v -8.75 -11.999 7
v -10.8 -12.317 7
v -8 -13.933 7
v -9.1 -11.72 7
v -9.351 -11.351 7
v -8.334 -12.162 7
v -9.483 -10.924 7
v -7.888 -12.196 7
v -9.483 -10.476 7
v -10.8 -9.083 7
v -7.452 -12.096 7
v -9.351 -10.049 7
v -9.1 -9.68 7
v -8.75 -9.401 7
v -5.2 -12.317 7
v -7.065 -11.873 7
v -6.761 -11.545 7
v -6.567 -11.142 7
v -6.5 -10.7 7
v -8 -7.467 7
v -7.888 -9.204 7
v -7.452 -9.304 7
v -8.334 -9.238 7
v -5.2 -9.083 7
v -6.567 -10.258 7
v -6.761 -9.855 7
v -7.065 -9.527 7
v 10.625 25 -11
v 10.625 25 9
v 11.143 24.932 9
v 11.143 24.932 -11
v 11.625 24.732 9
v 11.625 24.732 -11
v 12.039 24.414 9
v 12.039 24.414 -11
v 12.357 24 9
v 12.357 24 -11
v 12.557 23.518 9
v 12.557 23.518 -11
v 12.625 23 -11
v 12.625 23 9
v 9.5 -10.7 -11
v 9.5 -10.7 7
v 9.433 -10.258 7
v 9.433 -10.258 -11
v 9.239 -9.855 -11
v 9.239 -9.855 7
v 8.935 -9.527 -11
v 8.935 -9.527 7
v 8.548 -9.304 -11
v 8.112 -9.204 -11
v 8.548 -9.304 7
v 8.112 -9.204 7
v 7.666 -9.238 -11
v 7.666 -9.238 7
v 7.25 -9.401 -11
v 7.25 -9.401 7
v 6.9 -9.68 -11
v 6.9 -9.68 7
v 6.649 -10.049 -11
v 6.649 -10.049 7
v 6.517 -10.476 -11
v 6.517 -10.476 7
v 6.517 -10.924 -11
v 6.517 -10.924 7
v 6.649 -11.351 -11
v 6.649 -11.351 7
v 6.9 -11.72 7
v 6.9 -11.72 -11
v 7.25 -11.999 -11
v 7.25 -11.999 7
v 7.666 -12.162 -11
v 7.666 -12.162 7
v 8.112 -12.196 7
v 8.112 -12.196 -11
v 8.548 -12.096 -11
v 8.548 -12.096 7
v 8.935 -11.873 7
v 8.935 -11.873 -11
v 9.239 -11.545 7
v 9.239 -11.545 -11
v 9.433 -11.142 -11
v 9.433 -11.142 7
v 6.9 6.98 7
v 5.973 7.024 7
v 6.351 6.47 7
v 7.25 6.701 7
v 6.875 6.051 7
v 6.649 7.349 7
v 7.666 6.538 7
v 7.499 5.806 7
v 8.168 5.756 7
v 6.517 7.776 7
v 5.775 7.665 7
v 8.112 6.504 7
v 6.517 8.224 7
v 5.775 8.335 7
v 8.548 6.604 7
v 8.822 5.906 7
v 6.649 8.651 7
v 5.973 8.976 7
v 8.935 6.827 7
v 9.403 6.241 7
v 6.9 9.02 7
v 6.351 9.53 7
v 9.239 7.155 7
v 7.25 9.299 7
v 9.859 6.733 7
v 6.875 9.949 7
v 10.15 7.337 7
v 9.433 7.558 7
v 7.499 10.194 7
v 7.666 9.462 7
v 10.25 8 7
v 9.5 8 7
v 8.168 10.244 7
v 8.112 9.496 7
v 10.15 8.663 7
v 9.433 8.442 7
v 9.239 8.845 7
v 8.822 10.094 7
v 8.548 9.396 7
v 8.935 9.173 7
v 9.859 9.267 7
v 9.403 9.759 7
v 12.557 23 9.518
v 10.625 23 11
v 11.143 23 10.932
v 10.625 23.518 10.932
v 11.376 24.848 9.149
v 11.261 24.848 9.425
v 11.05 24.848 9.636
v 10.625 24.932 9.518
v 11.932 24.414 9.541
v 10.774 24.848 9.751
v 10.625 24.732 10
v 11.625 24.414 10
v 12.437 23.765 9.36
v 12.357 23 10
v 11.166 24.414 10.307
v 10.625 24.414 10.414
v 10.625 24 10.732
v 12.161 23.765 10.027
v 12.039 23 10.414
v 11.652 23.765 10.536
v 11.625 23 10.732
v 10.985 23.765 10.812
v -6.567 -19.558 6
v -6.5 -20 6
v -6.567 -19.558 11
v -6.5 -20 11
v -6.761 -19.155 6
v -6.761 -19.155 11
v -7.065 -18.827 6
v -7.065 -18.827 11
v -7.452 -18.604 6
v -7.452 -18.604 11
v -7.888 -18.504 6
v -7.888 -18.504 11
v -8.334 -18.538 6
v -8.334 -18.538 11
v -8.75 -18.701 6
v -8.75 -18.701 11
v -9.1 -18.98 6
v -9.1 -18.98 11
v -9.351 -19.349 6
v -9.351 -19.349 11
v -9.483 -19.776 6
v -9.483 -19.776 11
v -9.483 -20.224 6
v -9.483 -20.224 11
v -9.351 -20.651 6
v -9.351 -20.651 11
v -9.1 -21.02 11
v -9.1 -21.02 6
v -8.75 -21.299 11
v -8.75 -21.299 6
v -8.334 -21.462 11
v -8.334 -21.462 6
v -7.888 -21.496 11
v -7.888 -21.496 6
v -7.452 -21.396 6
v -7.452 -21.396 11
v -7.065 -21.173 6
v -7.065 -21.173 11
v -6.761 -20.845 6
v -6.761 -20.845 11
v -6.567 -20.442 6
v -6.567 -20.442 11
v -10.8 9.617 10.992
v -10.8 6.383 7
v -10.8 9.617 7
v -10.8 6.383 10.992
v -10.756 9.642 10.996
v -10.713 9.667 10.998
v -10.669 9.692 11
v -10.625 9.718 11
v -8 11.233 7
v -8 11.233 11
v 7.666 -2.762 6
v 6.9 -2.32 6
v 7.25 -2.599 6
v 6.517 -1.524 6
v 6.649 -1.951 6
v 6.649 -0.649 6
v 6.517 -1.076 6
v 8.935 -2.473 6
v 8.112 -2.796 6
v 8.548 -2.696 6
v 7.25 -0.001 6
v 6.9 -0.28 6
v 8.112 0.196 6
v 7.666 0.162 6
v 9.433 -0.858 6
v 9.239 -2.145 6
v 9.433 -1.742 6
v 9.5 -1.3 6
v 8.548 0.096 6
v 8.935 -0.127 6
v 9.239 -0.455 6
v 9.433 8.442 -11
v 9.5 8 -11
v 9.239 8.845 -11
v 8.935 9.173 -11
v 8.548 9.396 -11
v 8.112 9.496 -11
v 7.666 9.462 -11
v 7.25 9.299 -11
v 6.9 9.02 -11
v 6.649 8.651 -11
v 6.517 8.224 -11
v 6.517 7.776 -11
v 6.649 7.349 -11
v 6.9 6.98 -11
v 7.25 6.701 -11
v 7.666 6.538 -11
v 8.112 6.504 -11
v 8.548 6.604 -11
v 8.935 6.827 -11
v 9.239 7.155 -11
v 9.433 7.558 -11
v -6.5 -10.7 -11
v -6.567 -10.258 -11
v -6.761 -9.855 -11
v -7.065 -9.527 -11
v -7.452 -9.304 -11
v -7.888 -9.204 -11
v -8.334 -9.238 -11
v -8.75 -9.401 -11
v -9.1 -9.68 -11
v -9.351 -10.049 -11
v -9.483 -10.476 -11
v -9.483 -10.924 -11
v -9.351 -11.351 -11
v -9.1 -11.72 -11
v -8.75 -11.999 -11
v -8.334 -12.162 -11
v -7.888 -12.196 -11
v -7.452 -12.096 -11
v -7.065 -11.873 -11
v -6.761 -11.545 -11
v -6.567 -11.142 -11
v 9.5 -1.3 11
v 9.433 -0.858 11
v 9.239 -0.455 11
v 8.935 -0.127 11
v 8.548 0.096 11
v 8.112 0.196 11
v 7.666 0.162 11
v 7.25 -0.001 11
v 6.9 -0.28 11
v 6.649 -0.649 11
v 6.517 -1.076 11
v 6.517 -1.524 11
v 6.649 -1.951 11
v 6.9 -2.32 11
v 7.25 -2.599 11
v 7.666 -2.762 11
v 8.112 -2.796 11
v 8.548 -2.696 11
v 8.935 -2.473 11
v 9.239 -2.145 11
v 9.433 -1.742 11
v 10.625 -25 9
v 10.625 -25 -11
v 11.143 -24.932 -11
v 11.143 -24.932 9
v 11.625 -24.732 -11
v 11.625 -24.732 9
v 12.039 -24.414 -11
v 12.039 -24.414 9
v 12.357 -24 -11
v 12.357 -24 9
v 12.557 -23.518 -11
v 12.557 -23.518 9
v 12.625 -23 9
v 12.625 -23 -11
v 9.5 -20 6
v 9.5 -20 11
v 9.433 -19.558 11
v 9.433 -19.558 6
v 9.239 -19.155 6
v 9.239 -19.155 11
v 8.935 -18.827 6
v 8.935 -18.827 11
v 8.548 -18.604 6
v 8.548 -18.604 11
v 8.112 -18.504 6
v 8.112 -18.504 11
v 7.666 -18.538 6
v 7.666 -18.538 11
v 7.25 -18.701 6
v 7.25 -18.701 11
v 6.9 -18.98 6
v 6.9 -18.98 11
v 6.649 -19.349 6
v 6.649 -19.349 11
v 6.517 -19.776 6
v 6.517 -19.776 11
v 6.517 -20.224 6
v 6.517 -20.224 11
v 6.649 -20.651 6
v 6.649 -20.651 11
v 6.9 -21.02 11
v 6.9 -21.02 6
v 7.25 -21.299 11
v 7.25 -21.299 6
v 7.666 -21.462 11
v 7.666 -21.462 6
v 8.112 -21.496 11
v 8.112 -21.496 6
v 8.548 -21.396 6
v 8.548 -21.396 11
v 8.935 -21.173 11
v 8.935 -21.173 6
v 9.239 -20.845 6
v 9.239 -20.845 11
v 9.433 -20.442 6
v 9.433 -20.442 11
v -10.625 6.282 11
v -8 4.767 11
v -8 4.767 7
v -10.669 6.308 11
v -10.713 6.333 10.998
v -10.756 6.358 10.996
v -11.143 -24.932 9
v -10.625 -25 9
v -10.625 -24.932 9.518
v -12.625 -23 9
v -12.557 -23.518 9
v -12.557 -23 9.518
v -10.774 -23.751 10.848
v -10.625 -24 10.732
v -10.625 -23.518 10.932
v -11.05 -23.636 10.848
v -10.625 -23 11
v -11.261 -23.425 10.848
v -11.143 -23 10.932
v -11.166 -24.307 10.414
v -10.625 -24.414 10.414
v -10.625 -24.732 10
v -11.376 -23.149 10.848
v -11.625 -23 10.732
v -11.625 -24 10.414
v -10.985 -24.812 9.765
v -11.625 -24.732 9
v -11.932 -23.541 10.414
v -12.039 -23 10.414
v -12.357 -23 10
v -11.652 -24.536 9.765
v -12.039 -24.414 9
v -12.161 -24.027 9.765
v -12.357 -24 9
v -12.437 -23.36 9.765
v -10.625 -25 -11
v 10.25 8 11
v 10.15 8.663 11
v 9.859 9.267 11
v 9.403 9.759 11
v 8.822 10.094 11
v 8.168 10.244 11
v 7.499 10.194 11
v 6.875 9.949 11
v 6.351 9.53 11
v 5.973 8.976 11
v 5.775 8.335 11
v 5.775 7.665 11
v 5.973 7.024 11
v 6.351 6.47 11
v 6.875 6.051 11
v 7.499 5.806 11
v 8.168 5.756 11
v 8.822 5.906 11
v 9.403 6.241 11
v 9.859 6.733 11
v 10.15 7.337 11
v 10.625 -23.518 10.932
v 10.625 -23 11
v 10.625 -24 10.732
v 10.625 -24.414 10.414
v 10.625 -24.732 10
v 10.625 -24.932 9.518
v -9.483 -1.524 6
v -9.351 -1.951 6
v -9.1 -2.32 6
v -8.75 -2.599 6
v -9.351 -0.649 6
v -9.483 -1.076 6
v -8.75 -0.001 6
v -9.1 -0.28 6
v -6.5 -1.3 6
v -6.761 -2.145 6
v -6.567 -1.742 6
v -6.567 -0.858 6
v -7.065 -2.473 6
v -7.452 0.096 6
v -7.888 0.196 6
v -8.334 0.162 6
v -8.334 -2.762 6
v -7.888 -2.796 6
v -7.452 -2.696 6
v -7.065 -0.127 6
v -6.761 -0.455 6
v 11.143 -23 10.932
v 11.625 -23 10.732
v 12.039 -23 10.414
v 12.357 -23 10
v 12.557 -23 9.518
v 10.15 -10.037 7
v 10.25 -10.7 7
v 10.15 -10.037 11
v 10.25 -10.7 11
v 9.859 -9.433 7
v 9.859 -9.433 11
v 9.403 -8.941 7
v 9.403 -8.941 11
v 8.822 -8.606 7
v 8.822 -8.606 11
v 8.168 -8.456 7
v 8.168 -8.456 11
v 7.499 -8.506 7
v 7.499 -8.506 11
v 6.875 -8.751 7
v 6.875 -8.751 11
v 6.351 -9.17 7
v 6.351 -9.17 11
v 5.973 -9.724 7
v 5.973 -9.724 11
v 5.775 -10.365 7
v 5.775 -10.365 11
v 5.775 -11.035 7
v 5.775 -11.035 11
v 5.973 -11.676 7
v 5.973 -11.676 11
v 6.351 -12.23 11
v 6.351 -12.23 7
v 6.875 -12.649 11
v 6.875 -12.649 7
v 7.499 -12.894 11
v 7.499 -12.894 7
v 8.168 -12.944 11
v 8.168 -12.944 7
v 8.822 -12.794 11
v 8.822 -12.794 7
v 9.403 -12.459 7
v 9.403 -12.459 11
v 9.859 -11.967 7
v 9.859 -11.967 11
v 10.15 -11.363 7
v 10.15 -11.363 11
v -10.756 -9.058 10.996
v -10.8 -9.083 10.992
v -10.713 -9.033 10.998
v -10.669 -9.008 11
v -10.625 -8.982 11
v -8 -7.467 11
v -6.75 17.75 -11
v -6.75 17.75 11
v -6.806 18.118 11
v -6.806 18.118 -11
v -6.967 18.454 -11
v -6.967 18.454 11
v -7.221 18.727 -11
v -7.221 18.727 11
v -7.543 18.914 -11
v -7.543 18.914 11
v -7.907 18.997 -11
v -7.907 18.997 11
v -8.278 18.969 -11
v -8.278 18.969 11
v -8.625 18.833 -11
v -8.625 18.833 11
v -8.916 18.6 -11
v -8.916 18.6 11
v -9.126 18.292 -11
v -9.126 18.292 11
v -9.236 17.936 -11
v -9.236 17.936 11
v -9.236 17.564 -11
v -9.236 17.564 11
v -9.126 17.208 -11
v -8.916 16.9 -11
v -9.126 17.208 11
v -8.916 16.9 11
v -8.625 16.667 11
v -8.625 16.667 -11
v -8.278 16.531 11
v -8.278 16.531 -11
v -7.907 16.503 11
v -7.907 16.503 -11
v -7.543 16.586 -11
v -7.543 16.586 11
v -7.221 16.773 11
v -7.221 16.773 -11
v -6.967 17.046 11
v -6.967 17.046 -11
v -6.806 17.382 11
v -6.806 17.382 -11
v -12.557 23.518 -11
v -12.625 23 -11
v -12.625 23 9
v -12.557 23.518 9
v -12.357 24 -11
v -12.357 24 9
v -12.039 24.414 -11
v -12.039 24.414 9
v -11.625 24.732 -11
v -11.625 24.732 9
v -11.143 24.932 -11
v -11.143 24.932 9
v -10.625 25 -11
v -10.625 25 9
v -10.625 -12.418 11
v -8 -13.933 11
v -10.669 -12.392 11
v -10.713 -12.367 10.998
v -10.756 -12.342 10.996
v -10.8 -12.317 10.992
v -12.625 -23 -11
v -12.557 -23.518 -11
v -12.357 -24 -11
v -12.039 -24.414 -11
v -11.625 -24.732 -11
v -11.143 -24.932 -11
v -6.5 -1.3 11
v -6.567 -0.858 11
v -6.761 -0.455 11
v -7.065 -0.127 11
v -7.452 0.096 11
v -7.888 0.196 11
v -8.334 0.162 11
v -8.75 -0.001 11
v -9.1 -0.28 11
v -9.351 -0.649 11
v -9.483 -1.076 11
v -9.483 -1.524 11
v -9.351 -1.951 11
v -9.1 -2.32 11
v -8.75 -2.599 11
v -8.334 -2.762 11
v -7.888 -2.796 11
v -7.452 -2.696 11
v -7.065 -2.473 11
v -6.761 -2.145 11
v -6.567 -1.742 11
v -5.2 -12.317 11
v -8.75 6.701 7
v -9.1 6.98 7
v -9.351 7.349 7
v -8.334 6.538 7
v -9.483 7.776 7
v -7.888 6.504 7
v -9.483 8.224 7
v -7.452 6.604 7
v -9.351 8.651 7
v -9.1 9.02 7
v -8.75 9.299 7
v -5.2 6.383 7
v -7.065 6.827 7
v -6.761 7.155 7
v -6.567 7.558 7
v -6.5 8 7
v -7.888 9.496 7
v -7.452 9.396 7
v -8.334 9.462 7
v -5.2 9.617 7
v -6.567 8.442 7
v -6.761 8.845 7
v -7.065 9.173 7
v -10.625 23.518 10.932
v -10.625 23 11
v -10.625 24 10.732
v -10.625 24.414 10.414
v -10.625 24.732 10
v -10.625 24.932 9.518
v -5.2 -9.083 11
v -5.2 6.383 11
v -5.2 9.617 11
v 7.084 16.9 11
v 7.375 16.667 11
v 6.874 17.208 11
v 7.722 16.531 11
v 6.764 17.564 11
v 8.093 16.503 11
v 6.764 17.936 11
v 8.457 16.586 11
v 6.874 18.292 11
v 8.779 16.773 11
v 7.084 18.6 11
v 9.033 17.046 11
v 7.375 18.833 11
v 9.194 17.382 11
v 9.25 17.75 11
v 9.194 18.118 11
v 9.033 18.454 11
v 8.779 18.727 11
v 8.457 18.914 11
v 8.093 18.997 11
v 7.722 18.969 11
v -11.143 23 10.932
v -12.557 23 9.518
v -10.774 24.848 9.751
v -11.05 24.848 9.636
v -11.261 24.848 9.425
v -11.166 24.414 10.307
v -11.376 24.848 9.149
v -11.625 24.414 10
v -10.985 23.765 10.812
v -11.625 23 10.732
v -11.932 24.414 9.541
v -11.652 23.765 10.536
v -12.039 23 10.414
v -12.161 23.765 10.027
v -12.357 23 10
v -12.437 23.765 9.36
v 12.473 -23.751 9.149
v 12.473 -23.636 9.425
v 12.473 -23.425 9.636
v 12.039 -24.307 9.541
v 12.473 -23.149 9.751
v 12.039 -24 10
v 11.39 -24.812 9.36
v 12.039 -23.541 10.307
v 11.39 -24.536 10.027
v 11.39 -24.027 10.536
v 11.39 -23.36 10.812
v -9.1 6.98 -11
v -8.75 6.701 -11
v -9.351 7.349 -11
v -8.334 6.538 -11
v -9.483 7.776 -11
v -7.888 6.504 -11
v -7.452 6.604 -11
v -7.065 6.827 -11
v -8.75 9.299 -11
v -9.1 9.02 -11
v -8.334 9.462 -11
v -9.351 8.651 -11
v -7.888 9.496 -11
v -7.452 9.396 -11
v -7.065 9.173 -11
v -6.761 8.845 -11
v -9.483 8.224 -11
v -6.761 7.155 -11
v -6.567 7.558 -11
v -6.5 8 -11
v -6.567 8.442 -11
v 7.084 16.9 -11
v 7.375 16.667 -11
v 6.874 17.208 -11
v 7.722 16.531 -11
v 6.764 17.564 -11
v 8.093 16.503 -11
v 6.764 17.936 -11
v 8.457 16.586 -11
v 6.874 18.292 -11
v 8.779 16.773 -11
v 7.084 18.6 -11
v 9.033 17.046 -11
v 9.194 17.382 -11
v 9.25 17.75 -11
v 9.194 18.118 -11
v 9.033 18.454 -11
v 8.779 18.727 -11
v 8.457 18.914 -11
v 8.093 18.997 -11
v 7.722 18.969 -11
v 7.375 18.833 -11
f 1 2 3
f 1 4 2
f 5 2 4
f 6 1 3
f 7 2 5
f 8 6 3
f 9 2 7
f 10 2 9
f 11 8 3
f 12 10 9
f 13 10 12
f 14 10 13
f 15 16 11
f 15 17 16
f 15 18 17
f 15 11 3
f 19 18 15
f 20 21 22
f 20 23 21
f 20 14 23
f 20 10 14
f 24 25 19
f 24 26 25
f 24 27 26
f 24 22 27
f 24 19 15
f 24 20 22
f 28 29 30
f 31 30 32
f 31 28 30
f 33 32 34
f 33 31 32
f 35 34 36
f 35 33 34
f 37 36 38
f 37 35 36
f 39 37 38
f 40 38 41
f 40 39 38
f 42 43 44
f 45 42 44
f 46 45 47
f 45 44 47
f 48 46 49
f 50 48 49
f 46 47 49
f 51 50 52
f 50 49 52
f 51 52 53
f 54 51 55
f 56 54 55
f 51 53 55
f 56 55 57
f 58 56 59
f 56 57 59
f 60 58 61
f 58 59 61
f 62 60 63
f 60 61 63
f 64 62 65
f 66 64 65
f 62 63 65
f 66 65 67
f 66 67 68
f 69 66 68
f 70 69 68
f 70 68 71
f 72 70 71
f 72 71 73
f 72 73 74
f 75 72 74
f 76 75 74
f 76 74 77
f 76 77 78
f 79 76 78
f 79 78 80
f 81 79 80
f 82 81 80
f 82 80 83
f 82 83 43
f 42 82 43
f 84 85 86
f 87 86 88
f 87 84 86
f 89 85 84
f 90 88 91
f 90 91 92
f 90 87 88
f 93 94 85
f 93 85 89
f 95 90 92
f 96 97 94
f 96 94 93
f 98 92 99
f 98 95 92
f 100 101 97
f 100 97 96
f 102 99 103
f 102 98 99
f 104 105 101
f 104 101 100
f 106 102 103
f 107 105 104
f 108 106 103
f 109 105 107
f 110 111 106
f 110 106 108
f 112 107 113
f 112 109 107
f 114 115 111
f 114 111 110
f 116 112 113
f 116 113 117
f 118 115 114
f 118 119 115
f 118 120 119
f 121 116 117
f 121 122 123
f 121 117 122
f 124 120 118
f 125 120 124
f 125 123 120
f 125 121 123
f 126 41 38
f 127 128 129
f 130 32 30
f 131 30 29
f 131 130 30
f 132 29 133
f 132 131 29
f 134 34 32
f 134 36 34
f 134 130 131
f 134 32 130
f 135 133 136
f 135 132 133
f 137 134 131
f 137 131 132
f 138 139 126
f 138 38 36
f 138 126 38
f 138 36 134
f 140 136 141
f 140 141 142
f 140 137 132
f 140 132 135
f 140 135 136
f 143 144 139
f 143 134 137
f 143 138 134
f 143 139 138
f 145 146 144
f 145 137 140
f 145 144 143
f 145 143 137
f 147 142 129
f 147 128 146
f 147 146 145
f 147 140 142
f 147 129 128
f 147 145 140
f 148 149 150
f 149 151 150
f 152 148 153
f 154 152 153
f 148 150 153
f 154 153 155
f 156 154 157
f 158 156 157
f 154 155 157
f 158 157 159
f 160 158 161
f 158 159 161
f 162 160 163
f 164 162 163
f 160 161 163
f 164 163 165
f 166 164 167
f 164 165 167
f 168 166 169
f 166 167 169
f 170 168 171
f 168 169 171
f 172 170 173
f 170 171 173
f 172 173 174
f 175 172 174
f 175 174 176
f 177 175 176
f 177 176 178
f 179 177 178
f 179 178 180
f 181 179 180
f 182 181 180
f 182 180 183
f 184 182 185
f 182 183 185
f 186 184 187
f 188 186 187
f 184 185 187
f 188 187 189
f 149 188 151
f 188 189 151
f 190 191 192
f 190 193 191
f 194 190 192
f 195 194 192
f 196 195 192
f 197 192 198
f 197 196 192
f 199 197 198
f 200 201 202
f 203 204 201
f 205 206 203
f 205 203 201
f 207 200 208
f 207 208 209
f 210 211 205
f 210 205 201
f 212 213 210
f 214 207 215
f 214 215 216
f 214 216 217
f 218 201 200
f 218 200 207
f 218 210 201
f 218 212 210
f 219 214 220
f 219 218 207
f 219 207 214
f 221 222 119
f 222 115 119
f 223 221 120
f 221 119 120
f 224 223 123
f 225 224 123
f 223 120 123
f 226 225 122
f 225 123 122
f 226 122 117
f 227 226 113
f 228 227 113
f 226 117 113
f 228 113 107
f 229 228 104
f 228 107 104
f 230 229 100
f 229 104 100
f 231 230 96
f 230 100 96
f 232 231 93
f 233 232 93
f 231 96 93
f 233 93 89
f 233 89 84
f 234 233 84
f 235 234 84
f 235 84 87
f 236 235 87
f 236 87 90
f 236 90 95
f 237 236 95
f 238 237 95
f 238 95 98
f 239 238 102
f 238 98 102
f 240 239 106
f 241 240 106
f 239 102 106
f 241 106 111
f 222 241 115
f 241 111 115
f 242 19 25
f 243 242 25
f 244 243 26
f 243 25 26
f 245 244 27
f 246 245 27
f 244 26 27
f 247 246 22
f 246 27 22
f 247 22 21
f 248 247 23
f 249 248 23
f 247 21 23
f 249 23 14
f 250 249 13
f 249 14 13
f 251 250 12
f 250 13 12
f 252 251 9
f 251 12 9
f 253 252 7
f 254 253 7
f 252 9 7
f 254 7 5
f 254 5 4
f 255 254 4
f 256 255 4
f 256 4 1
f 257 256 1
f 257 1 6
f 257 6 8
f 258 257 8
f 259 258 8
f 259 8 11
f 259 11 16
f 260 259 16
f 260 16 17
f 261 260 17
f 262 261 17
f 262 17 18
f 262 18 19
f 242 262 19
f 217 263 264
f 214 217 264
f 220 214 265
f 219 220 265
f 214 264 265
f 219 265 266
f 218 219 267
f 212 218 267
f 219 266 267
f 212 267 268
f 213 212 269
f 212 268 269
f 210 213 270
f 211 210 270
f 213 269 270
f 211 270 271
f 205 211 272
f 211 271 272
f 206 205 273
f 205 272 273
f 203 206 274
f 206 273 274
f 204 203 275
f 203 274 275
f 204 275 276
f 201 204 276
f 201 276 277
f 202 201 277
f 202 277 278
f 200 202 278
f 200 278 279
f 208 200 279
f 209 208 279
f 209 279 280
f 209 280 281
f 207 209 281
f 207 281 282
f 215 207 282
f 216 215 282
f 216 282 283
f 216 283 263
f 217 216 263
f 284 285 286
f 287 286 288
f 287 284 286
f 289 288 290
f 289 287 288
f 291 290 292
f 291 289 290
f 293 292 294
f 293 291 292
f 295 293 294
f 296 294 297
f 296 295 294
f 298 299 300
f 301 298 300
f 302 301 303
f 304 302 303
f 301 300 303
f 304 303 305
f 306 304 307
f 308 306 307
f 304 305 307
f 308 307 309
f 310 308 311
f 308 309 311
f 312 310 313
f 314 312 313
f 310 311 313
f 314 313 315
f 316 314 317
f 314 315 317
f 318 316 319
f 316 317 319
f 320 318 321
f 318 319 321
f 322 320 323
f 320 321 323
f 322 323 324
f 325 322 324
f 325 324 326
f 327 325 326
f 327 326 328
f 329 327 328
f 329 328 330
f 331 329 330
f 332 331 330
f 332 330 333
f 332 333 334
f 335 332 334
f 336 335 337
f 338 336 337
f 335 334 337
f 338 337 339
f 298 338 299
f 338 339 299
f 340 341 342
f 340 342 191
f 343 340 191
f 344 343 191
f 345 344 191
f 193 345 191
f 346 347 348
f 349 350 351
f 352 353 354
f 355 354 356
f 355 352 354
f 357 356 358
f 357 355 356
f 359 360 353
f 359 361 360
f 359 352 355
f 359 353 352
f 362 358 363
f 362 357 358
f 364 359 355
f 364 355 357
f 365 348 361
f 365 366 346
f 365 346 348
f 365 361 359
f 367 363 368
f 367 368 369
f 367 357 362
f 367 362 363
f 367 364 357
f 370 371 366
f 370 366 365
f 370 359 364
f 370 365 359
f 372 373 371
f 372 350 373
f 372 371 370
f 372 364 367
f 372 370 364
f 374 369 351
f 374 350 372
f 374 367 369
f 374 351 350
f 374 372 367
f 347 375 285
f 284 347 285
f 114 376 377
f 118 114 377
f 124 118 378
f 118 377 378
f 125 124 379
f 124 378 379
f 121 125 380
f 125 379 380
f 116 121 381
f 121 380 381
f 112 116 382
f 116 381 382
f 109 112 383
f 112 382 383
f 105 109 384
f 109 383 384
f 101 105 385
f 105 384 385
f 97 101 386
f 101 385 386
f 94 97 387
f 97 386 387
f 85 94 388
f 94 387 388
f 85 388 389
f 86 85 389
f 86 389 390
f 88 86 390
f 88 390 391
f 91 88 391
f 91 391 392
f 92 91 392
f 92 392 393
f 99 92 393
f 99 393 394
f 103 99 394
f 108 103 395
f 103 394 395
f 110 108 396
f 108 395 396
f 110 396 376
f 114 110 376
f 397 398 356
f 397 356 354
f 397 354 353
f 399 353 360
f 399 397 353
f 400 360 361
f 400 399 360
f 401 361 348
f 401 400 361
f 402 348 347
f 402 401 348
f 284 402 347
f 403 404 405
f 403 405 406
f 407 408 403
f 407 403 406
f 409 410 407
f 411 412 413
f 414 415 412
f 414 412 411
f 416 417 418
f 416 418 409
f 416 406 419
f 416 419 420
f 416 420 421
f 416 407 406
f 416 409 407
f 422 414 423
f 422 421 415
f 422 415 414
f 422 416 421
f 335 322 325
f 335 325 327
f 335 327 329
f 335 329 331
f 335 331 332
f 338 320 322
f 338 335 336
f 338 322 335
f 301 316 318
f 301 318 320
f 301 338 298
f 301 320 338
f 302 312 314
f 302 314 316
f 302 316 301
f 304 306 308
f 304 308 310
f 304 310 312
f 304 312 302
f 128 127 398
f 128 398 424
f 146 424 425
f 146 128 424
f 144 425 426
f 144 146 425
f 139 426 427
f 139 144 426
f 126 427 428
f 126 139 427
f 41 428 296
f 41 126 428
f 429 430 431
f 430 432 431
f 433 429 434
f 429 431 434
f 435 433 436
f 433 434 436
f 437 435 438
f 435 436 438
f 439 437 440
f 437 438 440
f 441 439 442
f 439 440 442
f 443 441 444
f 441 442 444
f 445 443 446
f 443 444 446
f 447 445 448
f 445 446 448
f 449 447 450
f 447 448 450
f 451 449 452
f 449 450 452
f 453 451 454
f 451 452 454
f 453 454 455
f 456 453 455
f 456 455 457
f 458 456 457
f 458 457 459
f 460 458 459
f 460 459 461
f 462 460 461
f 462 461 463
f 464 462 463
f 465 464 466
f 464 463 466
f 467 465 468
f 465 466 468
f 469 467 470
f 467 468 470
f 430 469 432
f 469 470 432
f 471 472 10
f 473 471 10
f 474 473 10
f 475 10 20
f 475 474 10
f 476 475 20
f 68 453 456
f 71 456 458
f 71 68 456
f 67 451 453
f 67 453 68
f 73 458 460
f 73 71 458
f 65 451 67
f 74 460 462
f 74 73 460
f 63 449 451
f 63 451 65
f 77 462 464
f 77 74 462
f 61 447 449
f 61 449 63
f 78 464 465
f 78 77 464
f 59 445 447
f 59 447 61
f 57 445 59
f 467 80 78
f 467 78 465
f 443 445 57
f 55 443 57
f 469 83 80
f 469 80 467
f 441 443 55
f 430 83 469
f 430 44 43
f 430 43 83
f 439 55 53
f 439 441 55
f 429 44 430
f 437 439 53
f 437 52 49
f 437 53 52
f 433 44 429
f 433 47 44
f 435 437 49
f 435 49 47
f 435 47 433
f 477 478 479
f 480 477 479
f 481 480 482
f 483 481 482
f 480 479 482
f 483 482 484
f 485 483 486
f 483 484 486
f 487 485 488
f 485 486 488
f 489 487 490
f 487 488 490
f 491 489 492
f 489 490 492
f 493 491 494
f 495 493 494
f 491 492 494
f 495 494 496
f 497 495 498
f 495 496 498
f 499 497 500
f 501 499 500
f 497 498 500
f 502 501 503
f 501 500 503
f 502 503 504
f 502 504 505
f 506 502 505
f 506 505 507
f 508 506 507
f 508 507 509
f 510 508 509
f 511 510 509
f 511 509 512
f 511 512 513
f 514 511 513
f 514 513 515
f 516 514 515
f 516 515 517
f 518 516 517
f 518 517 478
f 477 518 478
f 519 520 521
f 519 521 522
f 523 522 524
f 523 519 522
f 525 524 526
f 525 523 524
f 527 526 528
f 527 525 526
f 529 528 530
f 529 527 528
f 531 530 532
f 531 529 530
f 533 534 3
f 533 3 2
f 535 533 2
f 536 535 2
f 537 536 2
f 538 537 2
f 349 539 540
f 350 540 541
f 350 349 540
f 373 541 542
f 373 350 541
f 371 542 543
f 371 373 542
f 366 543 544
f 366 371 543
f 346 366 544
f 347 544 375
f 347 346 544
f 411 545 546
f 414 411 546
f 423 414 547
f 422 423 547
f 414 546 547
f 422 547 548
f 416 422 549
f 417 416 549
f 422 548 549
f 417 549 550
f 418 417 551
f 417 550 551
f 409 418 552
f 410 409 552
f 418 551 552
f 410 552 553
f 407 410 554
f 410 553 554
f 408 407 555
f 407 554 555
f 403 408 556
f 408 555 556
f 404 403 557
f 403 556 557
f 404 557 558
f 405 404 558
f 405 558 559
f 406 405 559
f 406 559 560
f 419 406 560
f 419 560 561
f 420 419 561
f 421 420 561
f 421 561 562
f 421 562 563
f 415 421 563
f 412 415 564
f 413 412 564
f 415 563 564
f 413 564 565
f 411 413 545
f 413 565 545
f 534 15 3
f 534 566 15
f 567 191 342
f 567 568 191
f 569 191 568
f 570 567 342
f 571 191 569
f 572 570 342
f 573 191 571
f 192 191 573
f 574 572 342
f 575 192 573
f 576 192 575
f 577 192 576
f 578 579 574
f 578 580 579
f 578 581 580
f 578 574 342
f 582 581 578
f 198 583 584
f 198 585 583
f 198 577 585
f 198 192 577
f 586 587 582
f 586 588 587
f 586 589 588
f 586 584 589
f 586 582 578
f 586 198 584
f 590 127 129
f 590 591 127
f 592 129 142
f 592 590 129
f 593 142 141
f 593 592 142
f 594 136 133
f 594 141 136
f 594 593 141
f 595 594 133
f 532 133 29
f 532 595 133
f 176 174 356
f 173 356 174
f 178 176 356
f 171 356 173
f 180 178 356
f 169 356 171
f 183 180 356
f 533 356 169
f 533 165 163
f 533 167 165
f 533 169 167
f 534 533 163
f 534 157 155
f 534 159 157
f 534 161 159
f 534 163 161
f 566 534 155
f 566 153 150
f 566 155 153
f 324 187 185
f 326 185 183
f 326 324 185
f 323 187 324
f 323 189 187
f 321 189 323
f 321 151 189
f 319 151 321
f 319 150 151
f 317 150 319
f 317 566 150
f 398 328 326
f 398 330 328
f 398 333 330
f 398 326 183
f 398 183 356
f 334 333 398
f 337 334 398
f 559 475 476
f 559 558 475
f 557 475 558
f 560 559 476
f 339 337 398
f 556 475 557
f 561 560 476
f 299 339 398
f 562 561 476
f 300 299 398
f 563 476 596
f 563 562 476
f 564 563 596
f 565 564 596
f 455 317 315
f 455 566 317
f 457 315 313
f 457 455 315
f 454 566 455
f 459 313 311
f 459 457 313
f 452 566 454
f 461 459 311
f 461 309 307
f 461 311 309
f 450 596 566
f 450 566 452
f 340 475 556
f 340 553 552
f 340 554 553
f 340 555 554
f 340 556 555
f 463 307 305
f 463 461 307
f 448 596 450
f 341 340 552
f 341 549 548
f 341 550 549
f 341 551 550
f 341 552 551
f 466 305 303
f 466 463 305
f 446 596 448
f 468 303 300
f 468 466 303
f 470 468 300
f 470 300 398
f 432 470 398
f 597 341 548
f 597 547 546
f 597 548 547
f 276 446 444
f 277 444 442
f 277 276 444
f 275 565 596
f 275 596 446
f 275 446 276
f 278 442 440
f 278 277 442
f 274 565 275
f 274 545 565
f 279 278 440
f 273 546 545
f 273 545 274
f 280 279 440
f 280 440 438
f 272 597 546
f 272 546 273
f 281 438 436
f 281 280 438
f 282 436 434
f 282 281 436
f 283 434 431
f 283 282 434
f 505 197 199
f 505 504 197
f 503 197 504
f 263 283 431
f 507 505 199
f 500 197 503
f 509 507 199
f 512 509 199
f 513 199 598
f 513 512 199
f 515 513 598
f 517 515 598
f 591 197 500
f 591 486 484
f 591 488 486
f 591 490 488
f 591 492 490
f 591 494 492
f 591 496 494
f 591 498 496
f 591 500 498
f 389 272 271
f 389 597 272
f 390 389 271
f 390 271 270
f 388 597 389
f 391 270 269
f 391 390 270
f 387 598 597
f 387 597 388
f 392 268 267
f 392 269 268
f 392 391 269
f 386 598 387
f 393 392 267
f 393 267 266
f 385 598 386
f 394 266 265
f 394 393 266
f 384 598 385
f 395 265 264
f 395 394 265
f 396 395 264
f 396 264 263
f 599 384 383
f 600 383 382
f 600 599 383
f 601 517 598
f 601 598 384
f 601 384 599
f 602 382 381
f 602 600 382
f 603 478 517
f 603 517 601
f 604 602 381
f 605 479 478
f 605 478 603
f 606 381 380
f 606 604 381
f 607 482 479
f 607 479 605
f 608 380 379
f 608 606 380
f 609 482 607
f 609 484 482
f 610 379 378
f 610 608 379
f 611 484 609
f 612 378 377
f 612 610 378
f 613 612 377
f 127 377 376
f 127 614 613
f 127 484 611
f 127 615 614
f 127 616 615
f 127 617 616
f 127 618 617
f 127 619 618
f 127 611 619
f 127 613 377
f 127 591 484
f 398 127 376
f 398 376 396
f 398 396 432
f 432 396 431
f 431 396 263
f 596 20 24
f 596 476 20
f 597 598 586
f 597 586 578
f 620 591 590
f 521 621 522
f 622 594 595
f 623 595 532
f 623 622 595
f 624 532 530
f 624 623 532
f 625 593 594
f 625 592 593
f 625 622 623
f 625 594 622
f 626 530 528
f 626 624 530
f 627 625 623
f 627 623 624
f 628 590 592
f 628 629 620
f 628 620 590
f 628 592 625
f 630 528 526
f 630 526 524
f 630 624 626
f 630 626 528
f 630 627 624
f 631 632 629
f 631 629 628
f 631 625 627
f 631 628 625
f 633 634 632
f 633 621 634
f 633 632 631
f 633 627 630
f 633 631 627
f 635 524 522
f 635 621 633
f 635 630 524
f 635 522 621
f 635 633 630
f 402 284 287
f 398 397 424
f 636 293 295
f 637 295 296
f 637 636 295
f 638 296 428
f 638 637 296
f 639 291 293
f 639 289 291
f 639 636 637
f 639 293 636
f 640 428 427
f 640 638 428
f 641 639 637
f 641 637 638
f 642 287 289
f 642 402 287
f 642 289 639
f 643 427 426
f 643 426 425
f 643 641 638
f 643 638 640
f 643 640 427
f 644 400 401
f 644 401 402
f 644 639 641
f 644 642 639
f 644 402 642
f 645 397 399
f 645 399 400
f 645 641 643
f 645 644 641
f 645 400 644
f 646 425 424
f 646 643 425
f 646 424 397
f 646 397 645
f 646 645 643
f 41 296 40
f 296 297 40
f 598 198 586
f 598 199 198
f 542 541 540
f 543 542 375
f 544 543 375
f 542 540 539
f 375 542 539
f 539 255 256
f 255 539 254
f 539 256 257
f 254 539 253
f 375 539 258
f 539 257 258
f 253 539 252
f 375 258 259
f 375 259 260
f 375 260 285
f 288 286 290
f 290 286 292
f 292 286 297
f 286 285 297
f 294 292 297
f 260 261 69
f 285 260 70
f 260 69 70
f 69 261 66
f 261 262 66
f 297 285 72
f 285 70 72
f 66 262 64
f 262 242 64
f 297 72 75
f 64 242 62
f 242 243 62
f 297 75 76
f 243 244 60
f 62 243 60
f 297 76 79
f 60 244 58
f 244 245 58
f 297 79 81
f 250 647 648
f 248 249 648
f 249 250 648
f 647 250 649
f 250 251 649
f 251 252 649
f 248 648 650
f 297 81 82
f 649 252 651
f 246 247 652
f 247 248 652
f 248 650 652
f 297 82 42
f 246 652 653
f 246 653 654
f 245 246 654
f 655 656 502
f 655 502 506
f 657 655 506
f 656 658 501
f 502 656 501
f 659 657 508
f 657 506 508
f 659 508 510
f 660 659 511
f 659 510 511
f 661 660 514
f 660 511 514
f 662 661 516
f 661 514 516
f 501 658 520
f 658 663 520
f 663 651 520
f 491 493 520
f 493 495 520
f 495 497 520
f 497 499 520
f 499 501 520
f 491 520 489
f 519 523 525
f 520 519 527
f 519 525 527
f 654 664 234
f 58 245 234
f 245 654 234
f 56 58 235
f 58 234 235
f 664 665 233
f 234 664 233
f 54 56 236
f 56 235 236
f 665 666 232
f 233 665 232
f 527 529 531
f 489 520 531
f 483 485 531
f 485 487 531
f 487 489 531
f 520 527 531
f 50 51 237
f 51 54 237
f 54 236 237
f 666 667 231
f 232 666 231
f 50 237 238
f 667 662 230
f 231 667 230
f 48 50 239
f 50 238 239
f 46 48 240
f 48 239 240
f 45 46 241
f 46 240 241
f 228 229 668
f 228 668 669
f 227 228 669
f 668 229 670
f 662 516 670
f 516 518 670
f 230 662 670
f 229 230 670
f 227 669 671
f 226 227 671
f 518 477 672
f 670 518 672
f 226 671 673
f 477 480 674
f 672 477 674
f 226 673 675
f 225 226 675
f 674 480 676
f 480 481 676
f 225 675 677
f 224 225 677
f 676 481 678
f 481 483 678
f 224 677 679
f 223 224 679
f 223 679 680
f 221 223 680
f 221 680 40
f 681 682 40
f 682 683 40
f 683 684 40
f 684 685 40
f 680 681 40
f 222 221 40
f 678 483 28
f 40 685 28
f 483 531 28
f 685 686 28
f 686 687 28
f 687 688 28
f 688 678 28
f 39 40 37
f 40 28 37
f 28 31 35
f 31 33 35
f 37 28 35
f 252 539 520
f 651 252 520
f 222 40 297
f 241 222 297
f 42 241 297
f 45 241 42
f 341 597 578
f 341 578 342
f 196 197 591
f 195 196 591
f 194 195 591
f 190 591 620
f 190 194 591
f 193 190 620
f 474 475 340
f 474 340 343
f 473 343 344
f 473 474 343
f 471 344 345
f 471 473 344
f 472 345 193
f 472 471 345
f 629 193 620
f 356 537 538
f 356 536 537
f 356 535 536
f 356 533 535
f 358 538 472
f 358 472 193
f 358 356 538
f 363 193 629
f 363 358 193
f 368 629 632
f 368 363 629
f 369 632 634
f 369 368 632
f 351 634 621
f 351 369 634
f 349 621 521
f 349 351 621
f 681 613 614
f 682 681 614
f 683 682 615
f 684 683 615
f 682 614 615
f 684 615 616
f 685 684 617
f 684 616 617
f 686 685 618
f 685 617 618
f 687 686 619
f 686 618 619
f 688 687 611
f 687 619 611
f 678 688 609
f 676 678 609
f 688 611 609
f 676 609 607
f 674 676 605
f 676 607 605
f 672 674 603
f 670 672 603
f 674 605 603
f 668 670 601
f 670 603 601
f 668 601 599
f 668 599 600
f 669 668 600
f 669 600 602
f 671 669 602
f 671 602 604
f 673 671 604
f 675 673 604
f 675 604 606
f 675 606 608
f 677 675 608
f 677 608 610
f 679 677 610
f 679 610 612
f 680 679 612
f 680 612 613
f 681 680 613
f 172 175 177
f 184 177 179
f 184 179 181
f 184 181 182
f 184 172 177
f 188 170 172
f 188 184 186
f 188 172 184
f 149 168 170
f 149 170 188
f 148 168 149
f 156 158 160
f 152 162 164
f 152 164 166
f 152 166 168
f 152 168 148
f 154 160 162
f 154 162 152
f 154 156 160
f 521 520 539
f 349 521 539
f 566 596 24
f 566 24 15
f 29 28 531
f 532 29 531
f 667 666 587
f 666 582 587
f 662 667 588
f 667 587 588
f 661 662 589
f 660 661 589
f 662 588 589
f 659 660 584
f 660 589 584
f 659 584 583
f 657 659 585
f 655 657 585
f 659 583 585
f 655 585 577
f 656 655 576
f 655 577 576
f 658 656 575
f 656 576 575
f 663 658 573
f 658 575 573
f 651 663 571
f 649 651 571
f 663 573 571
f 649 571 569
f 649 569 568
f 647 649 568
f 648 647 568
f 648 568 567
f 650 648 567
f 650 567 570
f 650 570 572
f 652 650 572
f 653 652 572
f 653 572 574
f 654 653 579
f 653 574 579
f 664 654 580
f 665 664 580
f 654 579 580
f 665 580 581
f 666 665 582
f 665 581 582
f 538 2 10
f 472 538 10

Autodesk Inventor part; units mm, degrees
ref_plane "YZ Plane" through (0, 0, 0) normal (1, 0, 0) x (0, 1, 0)
ref_plane "XZ Plane" through (0, 0, 0) normal (0, 1, 0) x (-1, 0, 0)
ref_plane "XY Plane" through (0, 0, 0) normal (0, 0, 1) x (1, 0, 0)
sketch "Эскиз1" plane through (0, 0, 0) normal (0, 0, 1) x (1, 0, 0)
  line L0 (-12.625, -25) -> (12.625, -25)
  line L1 (12.625, -25) -> (12.625, 25)
  line L2 (12.625, 25) -> (-12.625, 25)
  line L3 (-12.625, 25) -> (-12.625, -25)
  line L4 (-12.625, -25) -> (12.625, 25) construction
  line L5 (12.625, -25) -> (-12.625, 25) construction
  point P0 (0, 0)
  dimension "d0" = 25.25
  dimension "d1" = 50
extrude "Выдавливание1" add sketch "Эскиз1" along normal mid plane 22
fillet "Сопряжение1" radius 2 8 edges at (-12.625, -25, 0) (0, -25, 11) (-12.625, 0, 11) (12.625, 0, 11) (12.625, -25, 0) (0, 25, 11) (12.625, 25, 0) (-12.625, 25, 0)
sketch "Эскиз2" plane through (0, 0, 11) normal (0, 0, 1) x (1, 0, 0)
  circle A0 centre (-8, 17.75) radius 1.25
  circle A1 centre (8, 17.75) radius 1.25
  line L0 (-10.625, 23) -> (10.625, 23) projected
  point P0 (0, 0)
  dimension "d17" = 5.25
  dimension "d18" = 5.25
extrude "Выдавливание2" cut sketch "Эскиз2" against normal up to surface (22 mm away)
sketch "Эскиз3" plane through (0, 0, 11) normal (0, 0, 1) x (1, 0, 0)
  point P0 (0, 0)
sketch "Эскиз4" plane through (0, 0, 11) normal (0, 0, 1) x (1, 0, 0)
  circle A0 centre (8, 8) radius 1.5
  circle A1 centre (-8, 8) radius 1.5
  line L0 (-8, 8) -> (8, 8) construction
  circle A2 centre (-8, 17.75) radius 1.25 construction
  line L1 (-8, 17.75) -> (-8, 4.7032) construction
  line L2 (10.625, -23) -> (-10.625, -23) construction
  point P0 (0, 0)
  dimension "d7" = 3
  dimension "d8" = 16
  dimension "d16" = 9.75
extrude "Выдавливание3" cut sketch "Эскиз4" against normal up to surface (22 mm away)
sketch "Эскиз5" plane through (0, 0, 11) normal (0, 0, 1) x (1, 0, 0)
  circle A0 centre (8, 8) radius 1.5 projected
  circle A1 centre (8, 8) radius 2.25
  circle A2 centre (-8, 8) radius 1.5 projected
  line L0 (-8, 11.2332) -> (-5.2, 9.6166)
  line L1 (-5.2, 9.6166) -> (-5.2, 6.3834)
  line L2 (-5.2, 6.3834) -> (-8, 4.7668)
  line L3 (-8, 4.7668) -> (-10.8, 6.3834)
  line L4 (-10.8, 6.3834) -> (-10.8, 9.6166)
  line L5 (-10.8, 9.6166) -> (-8, 11.2332)
  point P0 (0, 0)
  dimension "d12" = 4.5
  dimension "d15" = 5.6
extrude "Выдавливание4" cut sketch "Эскиз5" against normal blind 4
sketch "Эскиз6" plane through (0, 0, 11) normal (0, 0, 1) x (1, 0, 0)
  circle A0 centre (-8, -1.3) radius 1.5
  circle A1 centre (8, -1.3) radius 1.5
  circle A2 centre (-8, -20) radius 1.5
  circle A3 centre (8, -20) radius 1.5
  line L0 (-8, -1.3) -> (-8, -20) construction
  line L1 (-8, -1.3) -> (8, -1.3) construction
  line L2 (-8, -20) -> (8, -20) construction
  line L3 (-10.625, -25) -> (10.625, -25) projected
  line L4 (10.625, -23) -> (-10.625, -23) projected
  line L5 (0, -23) -> (0, 23) construction
  line L6 (-10.625, 23) -> (10.625, 23) projected
  line L7 (0, 35) -> (0, -35) projected
  circle A4 centre (-8, 8) radius 1.5 projected
  point P0 (0, 0)
  point P1 (0, -20)
  dimension "d19" = 3
  dimension "d20" = 16
  dimension "d21" = 16
  dimension "d23" = 5
  dimension "d40" = 9.3
extrude "Выдавливание5" cut sketch "Эскиз6" against normal blind 5 contours A0 | A1 | A2 | A3
sketch "Эскиз7" plane through (0, 0, 11) normal (0, 0, 1) x (1, 0, 0)
  circle A0 centre (-8, -20) radius 1.5 projected
  circle A1 centre (-8, -1.3) radius 1.5 projected
  line L0 (-8, -20) -> (-8, -1.3) construction
  circle A2 centre (8, -20) radius 1.5 projected
  circle A3 centre (8, -1.3) radius 1.5 projected
  line L1 (8, -20) -> (8, -1.3) construction
  circle A4 centre (8, -10.7) radius 2.25
  line L2 (-10.8, -9.0834) -> (-8, -7.4668)
  line L3 (-8, -7.4668) -> (-5.2, -9.0834)
  line L4 (-5.2, -9.0834) -> (-5.2, -12.3166)
  line L5 (-5.2, -12.3166) -> (-8, -13.9332)
  line L6 (-8, -13.9332) -> (-10.8, -12.3166)
  line L7 (-10.8, -12.3166) -> (-10.8, -9.0834)
  circle A5 centre (-8, -10.7) radius 1.5
  circle A6 centre (8, -10.7) radius 1.5
  point P0 (0, 0)
  dimension "d28" = 4.5
  dimension "d29" = 5.6
  dimension "d35" = 3
  dimension "d41" = 9.3
  dimension "d42" = 9.3
extrude "Выдавливание8" cut sketch "Эскиз7" against normal blind 4 contours A4 | L2 L3 L4 L5 L6 L7
sketch "Эскиз9" plane through (0, 0, 11) normal (0, 0, 1) x (1, 0, 0)
  circle A0 centre (-8, -10.7) radius 1.5 projected
  circle A1 centre (8, -10.7) radius 1.5 projected
  point P0 (0, 0)
extrude "Выдавливание9" cut sketch "Эскиз9" against normal up to surface (22 mm away)
properties part number "крепление петли хвоста"
